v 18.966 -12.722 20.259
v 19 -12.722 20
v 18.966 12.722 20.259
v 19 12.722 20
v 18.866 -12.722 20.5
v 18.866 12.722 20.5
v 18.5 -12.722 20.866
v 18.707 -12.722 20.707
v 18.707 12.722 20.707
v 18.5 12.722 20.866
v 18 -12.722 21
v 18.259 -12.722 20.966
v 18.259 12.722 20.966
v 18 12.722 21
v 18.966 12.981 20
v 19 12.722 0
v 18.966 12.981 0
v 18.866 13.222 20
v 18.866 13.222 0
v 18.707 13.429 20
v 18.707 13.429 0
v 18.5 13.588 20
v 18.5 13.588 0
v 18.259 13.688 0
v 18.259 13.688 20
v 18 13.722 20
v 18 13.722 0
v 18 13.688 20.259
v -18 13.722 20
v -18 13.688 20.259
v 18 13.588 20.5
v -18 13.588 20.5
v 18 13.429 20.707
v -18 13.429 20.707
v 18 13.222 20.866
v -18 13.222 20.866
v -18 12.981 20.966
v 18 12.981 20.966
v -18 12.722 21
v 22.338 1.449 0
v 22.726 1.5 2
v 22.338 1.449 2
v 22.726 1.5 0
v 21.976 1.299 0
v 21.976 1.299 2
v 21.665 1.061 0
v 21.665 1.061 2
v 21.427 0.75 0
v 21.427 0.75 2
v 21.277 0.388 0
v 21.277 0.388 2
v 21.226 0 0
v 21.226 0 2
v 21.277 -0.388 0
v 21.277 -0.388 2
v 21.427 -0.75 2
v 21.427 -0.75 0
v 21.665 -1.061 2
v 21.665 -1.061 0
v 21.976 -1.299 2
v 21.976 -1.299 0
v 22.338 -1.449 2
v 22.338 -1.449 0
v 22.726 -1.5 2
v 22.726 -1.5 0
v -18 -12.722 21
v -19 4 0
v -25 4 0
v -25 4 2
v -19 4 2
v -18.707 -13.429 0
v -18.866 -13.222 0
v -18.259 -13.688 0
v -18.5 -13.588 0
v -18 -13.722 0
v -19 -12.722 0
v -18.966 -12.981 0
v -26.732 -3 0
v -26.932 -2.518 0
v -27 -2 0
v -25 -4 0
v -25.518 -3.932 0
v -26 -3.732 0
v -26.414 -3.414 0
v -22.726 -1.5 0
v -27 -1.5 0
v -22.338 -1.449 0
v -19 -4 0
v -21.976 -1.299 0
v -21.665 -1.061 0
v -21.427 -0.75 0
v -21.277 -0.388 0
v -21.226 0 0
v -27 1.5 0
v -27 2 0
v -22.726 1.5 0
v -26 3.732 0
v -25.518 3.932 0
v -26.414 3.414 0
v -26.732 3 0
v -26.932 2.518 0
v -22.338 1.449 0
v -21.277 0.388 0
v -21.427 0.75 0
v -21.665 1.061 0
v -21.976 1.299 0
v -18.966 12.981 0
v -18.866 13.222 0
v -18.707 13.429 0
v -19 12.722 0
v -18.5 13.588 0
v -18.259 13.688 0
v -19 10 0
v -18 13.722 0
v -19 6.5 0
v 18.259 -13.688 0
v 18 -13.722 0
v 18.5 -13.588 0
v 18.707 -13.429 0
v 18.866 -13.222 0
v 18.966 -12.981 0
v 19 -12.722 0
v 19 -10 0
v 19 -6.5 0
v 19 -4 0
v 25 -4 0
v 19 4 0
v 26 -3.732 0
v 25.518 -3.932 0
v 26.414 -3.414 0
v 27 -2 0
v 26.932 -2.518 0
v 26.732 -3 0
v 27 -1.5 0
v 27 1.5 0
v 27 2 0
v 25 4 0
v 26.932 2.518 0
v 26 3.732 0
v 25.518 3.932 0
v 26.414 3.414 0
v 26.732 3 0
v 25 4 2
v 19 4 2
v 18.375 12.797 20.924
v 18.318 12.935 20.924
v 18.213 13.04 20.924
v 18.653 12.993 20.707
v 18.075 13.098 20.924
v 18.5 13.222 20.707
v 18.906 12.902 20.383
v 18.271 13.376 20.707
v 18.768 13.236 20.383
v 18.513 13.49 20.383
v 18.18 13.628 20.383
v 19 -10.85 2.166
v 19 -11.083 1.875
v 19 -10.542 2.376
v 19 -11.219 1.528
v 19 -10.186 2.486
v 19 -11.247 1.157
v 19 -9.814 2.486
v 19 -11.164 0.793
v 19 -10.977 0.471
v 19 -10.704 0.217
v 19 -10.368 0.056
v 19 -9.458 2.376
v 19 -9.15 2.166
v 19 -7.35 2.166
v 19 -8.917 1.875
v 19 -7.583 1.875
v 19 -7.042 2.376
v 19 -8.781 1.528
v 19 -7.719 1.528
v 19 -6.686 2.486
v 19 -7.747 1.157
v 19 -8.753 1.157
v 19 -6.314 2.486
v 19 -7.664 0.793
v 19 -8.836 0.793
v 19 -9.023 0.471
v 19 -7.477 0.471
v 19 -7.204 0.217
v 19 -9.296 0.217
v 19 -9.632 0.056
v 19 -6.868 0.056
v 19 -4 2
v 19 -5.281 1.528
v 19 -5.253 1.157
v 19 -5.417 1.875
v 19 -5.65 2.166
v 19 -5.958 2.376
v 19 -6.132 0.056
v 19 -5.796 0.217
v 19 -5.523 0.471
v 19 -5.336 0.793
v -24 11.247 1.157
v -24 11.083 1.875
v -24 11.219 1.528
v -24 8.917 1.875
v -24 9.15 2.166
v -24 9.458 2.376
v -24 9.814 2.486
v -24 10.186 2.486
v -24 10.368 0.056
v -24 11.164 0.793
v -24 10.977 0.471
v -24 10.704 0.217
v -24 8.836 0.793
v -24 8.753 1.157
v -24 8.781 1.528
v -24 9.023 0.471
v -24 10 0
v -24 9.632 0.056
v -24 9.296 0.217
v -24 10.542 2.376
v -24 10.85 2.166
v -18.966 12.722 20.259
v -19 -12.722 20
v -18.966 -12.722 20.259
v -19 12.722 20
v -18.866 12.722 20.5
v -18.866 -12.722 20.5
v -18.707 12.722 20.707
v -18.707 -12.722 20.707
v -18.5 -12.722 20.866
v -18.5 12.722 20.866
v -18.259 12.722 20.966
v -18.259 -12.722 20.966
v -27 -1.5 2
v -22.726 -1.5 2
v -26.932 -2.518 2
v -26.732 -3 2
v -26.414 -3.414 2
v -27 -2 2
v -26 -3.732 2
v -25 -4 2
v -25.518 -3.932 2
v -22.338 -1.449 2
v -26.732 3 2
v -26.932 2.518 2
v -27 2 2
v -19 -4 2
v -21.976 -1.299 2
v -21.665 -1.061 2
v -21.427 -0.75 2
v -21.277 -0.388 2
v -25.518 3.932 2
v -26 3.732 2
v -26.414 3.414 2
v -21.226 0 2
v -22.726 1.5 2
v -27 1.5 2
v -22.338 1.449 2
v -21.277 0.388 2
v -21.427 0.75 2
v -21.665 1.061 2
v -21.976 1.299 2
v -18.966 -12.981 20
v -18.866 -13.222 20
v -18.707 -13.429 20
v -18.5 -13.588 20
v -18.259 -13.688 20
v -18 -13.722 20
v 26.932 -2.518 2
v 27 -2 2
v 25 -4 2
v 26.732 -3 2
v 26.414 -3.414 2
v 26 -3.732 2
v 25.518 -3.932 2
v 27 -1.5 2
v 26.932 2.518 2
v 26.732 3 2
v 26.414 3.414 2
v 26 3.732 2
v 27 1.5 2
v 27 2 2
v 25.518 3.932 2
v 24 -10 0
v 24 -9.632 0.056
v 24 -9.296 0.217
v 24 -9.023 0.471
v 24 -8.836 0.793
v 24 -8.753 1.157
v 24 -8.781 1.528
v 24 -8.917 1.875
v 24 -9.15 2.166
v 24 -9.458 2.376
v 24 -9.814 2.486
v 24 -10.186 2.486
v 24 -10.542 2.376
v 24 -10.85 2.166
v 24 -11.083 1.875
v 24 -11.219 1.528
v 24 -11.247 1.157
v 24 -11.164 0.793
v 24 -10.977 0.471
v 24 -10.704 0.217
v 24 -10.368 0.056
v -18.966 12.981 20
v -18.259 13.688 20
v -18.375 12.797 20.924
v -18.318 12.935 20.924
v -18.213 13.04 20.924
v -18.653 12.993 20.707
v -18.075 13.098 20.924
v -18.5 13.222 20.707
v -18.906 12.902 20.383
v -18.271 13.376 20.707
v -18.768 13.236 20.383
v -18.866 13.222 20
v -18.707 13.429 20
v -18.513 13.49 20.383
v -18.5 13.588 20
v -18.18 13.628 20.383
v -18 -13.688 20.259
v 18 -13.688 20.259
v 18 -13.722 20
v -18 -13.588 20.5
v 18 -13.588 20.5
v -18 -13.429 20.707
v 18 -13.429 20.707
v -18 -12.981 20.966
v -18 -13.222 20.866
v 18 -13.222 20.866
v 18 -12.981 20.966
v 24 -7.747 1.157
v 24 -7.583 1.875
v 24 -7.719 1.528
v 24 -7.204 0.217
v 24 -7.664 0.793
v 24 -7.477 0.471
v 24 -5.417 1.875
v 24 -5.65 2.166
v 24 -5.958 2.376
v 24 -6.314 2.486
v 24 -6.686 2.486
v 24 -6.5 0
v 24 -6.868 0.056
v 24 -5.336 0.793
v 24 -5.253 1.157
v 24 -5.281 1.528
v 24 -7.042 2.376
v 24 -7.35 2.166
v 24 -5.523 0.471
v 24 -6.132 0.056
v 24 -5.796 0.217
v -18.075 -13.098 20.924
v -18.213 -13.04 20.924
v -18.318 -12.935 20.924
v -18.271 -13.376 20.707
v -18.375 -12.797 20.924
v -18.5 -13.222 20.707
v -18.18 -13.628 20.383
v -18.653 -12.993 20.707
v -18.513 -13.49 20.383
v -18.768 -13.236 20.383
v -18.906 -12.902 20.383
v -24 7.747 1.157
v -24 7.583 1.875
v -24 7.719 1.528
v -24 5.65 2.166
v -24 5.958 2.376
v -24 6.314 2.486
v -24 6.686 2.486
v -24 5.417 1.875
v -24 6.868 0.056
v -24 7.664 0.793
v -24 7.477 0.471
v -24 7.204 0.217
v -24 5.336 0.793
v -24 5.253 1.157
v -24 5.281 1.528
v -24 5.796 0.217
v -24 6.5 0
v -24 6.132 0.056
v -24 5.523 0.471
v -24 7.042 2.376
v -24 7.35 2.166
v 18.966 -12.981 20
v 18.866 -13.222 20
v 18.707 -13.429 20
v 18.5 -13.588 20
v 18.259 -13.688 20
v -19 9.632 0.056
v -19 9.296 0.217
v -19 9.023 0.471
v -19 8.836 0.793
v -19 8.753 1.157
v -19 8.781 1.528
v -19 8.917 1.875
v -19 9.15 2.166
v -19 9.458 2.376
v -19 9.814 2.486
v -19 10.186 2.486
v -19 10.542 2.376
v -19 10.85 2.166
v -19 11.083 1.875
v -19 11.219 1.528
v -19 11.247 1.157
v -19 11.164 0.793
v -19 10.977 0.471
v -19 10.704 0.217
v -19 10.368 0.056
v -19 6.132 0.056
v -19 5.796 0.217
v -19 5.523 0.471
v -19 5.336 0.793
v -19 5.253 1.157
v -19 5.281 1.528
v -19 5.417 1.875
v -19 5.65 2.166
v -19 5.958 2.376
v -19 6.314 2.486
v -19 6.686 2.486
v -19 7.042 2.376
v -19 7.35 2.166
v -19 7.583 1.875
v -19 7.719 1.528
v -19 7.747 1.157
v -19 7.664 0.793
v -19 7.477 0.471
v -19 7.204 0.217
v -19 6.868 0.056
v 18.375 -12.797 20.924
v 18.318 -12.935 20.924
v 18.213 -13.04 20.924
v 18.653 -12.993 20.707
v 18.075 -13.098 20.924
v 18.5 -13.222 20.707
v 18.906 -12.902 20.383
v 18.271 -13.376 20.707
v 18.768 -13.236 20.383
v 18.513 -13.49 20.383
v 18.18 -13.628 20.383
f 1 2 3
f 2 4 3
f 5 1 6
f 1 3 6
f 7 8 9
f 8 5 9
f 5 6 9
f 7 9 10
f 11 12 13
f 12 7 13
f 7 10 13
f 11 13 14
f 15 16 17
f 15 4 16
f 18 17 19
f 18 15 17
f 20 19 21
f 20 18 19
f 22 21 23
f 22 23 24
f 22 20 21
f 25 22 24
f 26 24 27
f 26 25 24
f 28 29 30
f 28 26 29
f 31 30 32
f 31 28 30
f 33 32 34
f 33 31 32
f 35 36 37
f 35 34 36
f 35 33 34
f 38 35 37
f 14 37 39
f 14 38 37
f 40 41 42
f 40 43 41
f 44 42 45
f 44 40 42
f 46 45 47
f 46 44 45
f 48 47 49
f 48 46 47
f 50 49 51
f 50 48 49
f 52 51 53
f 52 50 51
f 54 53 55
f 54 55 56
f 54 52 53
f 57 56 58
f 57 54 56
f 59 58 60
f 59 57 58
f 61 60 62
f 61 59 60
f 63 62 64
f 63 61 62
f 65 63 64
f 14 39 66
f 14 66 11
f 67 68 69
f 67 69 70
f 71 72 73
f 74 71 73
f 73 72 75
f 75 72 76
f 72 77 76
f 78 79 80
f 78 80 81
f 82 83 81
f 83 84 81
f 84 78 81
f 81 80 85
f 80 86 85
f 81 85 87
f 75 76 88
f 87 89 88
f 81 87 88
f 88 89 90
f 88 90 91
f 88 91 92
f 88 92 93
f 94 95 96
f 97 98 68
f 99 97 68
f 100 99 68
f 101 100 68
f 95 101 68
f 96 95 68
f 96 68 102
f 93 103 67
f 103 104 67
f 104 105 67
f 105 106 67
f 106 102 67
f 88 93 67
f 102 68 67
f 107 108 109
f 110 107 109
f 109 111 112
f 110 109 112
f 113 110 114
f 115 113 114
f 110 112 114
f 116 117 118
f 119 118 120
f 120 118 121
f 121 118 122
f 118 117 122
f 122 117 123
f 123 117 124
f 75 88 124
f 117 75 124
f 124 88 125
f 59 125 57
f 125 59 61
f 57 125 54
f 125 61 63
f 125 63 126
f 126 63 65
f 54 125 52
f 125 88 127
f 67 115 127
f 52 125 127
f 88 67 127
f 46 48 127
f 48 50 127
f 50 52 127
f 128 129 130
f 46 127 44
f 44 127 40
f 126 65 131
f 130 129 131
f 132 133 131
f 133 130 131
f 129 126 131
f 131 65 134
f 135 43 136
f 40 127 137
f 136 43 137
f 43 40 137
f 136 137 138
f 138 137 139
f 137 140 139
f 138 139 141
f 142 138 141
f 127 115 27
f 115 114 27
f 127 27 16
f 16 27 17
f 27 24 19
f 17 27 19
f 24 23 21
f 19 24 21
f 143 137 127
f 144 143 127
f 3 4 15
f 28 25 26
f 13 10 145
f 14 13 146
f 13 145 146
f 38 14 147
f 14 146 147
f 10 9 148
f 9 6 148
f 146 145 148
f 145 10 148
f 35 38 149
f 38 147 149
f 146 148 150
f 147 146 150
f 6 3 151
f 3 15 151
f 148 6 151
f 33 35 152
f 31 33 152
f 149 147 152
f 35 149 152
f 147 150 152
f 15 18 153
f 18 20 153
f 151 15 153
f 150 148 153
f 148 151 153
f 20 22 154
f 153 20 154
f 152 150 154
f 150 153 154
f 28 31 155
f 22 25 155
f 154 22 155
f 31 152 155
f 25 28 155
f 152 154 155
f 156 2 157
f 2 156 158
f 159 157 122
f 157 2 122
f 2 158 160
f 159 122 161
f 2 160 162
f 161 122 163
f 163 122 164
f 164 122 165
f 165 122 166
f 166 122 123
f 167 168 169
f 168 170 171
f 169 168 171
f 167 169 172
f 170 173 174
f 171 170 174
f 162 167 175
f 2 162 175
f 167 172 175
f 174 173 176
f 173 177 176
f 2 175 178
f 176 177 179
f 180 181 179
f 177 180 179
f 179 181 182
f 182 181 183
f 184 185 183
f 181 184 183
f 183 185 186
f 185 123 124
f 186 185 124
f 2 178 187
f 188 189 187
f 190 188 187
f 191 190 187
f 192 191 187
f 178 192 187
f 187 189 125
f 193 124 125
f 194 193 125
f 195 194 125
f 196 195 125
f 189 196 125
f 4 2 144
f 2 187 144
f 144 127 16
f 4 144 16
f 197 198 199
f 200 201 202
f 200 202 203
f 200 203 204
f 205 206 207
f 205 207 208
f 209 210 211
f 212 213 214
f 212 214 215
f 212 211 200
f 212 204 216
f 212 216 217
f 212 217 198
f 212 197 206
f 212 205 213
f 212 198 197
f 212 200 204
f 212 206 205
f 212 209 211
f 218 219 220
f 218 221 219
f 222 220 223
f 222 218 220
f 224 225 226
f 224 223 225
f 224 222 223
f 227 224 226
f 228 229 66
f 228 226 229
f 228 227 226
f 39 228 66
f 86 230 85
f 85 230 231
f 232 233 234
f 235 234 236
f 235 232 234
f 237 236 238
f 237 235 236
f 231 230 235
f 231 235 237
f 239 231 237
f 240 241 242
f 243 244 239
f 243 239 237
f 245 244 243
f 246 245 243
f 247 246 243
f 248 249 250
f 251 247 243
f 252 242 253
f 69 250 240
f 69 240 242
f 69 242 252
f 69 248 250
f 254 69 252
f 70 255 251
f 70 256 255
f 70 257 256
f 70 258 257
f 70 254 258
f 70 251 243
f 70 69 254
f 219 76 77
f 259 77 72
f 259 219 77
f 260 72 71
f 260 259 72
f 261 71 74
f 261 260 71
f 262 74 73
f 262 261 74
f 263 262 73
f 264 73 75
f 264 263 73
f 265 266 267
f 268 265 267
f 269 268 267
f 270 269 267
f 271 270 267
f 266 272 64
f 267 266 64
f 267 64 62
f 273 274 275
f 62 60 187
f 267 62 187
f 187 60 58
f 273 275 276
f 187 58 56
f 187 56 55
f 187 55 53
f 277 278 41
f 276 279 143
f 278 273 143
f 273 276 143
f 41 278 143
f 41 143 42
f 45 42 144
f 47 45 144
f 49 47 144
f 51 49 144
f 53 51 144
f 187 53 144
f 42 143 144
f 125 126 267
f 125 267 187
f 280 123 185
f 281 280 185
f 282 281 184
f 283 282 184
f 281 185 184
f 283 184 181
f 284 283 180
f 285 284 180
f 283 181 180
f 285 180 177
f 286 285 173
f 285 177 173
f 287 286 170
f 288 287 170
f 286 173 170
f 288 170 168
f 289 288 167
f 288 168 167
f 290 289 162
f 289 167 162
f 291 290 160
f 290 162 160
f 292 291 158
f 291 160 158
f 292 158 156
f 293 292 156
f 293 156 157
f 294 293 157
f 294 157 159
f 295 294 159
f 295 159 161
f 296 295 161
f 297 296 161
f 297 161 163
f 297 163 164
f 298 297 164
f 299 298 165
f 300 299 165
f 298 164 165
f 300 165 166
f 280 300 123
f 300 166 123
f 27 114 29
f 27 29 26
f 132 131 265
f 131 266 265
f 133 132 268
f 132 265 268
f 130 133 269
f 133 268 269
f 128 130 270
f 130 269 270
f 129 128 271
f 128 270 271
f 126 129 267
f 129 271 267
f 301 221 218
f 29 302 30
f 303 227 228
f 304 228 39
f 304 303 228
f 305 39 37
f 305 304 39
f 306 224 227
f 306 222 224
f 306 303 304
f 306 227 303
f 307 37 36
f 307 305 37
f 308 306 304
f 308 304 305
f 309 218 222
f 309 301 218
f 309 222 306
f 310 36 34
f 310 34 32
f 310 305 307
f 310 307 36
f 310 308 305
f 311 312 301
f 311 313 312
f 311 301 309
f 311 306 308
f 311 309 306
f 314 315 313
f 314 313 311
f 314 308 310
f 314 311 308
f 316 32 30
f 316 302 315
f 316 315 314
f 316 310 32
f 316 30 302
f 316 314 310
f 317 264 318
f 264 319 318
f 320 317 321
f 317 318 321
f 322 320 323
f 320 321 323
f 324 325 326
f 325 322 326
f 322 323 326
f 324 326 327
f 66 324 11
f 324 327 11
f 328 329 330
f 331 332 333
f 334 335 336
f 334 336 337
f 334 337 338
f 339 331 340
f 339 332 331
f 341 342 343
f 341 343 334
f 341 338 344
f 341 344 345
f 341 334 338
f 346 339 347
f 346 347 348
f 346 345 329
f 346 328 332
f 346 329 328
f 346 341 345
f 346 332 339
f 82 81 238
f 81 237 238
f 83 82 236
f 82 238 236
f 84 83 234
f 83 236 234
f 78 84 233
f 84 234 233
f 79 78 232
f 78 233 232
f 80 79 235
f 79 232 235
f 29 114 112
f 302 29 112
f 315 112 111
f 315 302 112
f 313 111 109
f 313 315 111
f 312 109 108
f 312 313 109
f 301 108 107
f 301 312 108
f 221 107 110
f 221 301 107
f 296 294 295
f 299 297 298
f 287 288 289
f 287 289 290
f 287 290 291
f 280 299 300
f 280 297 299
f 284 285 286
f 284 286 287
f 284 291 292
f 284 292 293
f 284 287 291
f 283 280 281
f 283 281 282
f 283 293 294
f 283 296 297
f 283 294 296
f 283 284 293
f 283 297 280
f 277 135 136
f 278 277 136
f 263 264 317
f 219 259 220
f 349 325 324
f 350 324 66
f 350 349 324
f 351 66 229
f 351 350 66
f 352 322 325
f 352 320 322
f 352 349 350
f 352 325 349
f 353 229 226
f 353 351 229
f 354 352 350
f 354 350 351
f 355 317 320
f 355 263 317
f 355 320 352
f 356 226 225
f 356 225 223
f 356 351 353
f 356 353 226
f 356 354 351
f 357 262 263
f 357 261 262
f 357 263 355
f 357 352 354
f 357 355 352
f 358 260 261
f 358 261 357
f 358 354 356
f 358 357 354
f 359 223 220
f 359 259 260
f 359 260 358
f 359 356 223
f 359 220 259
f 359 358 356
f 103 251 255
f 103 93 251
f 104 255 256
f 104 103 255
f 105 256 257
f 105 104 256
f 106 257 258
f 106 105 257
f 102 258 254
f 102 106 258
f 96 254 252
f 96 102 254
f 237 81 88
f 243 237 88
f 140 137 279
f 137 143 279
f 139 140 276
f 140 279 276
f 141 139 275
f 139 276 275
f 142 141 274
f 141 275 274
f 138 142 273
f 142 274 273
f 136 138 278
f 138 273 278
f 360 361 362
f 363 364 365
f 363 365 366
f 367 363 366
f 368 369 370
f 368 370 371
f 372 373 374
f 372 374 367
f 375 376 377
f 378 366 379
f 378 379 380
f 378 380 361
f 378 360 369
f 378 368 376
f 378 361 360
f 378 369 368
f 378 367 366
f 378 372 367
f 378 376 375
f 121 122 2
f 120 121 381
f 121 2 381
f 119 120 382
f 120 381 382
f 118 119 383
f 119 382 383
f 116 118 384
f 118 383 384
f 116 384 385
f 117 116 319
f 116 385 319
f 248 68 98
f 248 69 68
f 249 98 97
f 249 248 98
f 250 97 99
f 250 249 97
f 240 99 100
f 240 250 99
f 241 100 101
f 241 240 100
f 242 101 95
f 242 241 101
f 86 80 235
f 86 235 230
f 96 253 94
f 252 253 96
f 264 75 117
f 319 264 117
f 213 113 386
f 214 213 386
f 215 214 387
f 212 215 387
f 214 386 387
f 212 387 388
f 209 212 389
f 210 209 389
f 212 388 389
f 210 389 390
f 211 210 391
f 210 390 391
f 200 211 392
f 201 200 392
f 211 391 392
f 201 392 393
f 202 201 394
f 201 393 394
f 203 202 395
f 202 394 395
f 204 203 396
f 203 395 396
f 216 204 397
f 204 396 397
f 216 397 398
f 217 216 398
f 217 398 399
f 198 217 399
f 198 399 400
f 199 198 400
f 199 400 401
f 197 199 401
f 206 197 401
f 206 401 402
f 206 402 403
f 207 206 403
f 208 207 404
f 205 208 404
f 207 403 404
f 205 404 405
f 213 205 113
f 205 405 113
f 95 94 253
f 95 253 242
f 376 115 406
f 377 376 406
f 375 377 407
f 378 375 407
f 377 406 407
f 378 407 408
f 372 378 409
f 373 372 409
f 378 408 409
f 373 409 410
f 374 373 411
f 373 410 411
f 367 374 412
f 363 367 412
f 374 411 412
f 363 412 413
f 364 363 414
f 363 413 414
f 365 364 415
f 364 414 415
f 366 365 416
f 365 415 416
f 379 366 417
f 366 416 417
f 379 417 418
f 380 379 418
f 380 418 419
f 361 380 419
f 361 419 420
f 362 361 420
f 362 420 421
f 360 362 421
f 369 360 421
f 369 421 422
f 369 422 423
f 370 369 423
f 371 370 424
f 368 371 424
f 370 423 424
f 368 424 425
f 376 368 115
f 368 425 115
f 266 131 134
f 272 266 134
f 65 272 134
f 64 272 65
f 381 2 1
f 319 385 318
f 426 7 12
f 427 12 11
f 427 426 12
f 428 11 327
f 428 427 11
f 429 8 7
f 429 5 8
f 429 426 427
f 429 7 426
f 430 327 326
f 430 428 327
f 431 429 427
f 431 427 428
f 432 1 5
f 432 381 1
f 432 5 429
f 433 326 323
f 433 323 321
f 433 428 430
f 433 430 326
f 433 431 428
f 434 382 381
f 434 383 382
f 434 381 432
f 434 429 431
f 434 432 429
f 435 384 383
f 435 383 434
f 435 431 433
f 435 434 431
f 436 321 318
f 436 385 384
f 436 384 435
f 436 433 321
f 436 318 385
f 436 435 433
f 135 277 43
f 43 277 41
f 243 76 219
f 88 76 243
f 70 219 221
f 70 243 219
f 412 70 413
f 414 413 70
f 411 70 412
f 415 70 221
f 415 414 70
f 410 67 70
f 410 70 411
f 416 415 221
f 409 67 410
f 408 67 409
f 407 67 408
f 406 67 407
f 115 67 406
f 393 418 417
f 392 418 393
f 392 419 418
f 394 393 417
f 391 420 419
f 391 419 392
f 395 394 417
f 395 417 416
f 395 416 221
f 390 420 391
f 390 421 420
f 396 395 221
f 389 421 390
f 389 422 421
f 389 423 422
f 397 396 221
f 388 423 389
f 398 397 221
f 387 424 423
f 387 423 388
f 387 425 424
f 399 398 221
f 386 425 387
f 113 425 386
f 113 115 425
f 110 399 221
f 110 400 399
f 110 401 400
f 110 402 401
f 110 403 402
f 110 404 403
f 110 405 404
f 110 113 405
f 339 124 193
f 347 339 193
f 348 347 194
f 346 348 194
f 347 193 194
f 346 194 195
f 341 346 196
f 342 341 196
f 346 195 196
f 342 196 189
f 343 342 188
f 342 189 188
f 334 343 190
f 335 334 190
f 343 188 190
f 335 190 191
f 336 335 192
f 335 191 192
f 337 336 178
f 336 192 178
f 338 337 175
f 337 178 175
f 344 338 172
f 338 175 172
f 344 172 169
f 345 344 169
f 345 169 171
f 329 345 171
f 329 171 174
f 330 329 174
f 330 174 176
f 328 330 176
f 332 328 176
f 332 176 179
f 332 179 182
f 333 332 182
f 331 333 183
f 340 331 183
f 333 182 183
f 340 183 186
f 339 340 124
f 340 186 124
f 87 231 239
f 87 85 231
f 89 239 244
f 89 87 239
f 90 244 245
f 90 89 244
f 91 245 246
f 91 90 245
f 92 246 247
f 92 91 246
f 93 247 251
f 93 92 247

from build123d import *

# Parameters (mm, degrees)
SKETCH1_W            = 38
SKETCH1_H            = 27.444444444
BOSS_EXTRUDE1_DEPTH  = 21
SKETCH2_W            = 8
SKETCH2_H            = 8
BOSS_EXTRUDE2_DEPTH  = 2
SKETCH3_W            = 5.774074058
SKETCH3_H            = 3
CUT_EXTRUDE1_DEPTH   = 2
FILLET1_R            = 2
FILLET2_R            = 1.5
FILLET1_OF_MIRROR1_R = 2
FILLET2_OF_MIRROR1_R = 1.5
SKETCH5_R            = 1.25
BOSS_EXTRUDE3_DEPTH  = 5
SKETCH6_R            = 1.25
BOSS_EXTRUDE4_DEPTH  = 5
FILLET5_R            = 1


with BuildPart() as part:
    # Sketch1 → Boss-Extrude1 (new body)
    with BuildSketch(Plane.XY):
        Rectangle(SKETCH1_W, SKETCH1_H)
    extrude(amount=BOSS_EXTRUDE1_DEPTH)

    # Sketch2 → Boss-Extrude2 (add)
    with BuildSketch(Plane.XY):
        with Locations((-23, 0)):
            Rectangle(SKETCH2_W, SKETCH2_H)
    boss_extrude2 = extrude(amount=BOSS_EXTRUDE2_DEPTH)

    # Sketch3 → Cut-Extrude1 (cut)
    with BuildSketch(Plane.XY.offset(2)):
        with Locations((-24.112962971, 0)):
            Rectangle(SKETCH3_W, SKETCH3_H)
    cut_extrude1 = extrude(amount=-CUT_EXTRUDE1_DEPTH, mode=Mode.SUBTRACT)

    # Fillet1
    fillet1_edges = [part.edges().sort_by_distance(p)[0] for p in [
        (-27, -4, 1),
        (-27, 4, 1),
    ]]
    fillet(fillet1_edges, radius=FILLET1_R)

    # Fillet2
    fillet2_edges = [part.edges().sort_by_distance(p)[0] for p in [
        (-21.225925942, 1.5, 1),
        (-21.225925942, -1.5, 1),
    ]]
    fillet(fillet2_edges, radius=FILLET2_R - 0.0001)  # a hair under: the kernel refuses the full size

    # Mirror1: Boss-Extrude2, Cut-Extrude1 across plane
    add(boss_extrude2.mirror(Plane(origin=(0, 0, 0), x_dir=(0, 0, 1), z_dir=(1, 0, 0))))
    add(cut_extrude1.mirror(Plane(origin=(0, 0, 0), x_dir=(0, 0, 1), z_dir=(1, 0, 0))), mode=Mode.SUBTRACT)

    # Fillet1 of Mirror1
    fillet1_of_mirror1_edges = [part.edges().sort_by_distance(p)[0] for p in [
        (27, -4, 1),
        (27, 4, 1),
    ]]
    fillet(fillet1_of_mirror1_edges, radius=FILLET1_OF_MIRROR1_R)

    # Fillet2 of Mirror1
    fillet2_of_mirror1_edges = [part.edges().sort_by_distance(p)[0] for p in [
        (21.225925942, 1.5, 1),
        (21.225925942, -1.5, 1),
    ]]
    fillet(fillet2_of_mirror1_edges, radius=FILLET2_OF_MIRROR1_R - 0.0001)  # a hair under: the kernel refuses the full size

    # Sketch5 → Boss-Extrude3 (add)
    with BuildSketch(Plane.ZY.offset(19)):
        with Locations(Location((1.25, 10, 0), (0, 0, 180))):
            Circle(SKETCH5_R)
        with Locations(Location((1.25, 6.5, 0), (0, 0, 180))):
            Circle(SKETCH5_R)
    extrude(amount=BOSS_EXTRUDE3_DEPTH)

    # Sketch6 → Boss-Extrude4 (add)
    with BuildSketch(Plane(origin=(19, 0, 0), x_dir=(0, 0, -1), z_dir=(1, 0, 0))):
        with Locations((-1.25, -6.5)):
            Circle(SKETCH6_R)
        with Locations((-1.25, -10)):
            Circle(SKETCH6_R)
    extrude(amount=BOSS_EXTRUDE4_DEPTH)

    # Fillet5
    fillet5_edges = [part.edges().sort_by_distance(p)[0] for p in [
        (19, 13.722222222, 10.5),
        (19, -13.722222222, 10.5),
        (-19, -13.722222222, 10.5),
        (-19, 13.722222222, 10.5),
        (19, 0, 21),
        (0, -13.722222222, 21),
        (-19, 0, 21),
        (0, 13.722222222, 21),
    ]]
    fillet(fillet5_edges, radius=FILLET5_R)


solid = part.part
